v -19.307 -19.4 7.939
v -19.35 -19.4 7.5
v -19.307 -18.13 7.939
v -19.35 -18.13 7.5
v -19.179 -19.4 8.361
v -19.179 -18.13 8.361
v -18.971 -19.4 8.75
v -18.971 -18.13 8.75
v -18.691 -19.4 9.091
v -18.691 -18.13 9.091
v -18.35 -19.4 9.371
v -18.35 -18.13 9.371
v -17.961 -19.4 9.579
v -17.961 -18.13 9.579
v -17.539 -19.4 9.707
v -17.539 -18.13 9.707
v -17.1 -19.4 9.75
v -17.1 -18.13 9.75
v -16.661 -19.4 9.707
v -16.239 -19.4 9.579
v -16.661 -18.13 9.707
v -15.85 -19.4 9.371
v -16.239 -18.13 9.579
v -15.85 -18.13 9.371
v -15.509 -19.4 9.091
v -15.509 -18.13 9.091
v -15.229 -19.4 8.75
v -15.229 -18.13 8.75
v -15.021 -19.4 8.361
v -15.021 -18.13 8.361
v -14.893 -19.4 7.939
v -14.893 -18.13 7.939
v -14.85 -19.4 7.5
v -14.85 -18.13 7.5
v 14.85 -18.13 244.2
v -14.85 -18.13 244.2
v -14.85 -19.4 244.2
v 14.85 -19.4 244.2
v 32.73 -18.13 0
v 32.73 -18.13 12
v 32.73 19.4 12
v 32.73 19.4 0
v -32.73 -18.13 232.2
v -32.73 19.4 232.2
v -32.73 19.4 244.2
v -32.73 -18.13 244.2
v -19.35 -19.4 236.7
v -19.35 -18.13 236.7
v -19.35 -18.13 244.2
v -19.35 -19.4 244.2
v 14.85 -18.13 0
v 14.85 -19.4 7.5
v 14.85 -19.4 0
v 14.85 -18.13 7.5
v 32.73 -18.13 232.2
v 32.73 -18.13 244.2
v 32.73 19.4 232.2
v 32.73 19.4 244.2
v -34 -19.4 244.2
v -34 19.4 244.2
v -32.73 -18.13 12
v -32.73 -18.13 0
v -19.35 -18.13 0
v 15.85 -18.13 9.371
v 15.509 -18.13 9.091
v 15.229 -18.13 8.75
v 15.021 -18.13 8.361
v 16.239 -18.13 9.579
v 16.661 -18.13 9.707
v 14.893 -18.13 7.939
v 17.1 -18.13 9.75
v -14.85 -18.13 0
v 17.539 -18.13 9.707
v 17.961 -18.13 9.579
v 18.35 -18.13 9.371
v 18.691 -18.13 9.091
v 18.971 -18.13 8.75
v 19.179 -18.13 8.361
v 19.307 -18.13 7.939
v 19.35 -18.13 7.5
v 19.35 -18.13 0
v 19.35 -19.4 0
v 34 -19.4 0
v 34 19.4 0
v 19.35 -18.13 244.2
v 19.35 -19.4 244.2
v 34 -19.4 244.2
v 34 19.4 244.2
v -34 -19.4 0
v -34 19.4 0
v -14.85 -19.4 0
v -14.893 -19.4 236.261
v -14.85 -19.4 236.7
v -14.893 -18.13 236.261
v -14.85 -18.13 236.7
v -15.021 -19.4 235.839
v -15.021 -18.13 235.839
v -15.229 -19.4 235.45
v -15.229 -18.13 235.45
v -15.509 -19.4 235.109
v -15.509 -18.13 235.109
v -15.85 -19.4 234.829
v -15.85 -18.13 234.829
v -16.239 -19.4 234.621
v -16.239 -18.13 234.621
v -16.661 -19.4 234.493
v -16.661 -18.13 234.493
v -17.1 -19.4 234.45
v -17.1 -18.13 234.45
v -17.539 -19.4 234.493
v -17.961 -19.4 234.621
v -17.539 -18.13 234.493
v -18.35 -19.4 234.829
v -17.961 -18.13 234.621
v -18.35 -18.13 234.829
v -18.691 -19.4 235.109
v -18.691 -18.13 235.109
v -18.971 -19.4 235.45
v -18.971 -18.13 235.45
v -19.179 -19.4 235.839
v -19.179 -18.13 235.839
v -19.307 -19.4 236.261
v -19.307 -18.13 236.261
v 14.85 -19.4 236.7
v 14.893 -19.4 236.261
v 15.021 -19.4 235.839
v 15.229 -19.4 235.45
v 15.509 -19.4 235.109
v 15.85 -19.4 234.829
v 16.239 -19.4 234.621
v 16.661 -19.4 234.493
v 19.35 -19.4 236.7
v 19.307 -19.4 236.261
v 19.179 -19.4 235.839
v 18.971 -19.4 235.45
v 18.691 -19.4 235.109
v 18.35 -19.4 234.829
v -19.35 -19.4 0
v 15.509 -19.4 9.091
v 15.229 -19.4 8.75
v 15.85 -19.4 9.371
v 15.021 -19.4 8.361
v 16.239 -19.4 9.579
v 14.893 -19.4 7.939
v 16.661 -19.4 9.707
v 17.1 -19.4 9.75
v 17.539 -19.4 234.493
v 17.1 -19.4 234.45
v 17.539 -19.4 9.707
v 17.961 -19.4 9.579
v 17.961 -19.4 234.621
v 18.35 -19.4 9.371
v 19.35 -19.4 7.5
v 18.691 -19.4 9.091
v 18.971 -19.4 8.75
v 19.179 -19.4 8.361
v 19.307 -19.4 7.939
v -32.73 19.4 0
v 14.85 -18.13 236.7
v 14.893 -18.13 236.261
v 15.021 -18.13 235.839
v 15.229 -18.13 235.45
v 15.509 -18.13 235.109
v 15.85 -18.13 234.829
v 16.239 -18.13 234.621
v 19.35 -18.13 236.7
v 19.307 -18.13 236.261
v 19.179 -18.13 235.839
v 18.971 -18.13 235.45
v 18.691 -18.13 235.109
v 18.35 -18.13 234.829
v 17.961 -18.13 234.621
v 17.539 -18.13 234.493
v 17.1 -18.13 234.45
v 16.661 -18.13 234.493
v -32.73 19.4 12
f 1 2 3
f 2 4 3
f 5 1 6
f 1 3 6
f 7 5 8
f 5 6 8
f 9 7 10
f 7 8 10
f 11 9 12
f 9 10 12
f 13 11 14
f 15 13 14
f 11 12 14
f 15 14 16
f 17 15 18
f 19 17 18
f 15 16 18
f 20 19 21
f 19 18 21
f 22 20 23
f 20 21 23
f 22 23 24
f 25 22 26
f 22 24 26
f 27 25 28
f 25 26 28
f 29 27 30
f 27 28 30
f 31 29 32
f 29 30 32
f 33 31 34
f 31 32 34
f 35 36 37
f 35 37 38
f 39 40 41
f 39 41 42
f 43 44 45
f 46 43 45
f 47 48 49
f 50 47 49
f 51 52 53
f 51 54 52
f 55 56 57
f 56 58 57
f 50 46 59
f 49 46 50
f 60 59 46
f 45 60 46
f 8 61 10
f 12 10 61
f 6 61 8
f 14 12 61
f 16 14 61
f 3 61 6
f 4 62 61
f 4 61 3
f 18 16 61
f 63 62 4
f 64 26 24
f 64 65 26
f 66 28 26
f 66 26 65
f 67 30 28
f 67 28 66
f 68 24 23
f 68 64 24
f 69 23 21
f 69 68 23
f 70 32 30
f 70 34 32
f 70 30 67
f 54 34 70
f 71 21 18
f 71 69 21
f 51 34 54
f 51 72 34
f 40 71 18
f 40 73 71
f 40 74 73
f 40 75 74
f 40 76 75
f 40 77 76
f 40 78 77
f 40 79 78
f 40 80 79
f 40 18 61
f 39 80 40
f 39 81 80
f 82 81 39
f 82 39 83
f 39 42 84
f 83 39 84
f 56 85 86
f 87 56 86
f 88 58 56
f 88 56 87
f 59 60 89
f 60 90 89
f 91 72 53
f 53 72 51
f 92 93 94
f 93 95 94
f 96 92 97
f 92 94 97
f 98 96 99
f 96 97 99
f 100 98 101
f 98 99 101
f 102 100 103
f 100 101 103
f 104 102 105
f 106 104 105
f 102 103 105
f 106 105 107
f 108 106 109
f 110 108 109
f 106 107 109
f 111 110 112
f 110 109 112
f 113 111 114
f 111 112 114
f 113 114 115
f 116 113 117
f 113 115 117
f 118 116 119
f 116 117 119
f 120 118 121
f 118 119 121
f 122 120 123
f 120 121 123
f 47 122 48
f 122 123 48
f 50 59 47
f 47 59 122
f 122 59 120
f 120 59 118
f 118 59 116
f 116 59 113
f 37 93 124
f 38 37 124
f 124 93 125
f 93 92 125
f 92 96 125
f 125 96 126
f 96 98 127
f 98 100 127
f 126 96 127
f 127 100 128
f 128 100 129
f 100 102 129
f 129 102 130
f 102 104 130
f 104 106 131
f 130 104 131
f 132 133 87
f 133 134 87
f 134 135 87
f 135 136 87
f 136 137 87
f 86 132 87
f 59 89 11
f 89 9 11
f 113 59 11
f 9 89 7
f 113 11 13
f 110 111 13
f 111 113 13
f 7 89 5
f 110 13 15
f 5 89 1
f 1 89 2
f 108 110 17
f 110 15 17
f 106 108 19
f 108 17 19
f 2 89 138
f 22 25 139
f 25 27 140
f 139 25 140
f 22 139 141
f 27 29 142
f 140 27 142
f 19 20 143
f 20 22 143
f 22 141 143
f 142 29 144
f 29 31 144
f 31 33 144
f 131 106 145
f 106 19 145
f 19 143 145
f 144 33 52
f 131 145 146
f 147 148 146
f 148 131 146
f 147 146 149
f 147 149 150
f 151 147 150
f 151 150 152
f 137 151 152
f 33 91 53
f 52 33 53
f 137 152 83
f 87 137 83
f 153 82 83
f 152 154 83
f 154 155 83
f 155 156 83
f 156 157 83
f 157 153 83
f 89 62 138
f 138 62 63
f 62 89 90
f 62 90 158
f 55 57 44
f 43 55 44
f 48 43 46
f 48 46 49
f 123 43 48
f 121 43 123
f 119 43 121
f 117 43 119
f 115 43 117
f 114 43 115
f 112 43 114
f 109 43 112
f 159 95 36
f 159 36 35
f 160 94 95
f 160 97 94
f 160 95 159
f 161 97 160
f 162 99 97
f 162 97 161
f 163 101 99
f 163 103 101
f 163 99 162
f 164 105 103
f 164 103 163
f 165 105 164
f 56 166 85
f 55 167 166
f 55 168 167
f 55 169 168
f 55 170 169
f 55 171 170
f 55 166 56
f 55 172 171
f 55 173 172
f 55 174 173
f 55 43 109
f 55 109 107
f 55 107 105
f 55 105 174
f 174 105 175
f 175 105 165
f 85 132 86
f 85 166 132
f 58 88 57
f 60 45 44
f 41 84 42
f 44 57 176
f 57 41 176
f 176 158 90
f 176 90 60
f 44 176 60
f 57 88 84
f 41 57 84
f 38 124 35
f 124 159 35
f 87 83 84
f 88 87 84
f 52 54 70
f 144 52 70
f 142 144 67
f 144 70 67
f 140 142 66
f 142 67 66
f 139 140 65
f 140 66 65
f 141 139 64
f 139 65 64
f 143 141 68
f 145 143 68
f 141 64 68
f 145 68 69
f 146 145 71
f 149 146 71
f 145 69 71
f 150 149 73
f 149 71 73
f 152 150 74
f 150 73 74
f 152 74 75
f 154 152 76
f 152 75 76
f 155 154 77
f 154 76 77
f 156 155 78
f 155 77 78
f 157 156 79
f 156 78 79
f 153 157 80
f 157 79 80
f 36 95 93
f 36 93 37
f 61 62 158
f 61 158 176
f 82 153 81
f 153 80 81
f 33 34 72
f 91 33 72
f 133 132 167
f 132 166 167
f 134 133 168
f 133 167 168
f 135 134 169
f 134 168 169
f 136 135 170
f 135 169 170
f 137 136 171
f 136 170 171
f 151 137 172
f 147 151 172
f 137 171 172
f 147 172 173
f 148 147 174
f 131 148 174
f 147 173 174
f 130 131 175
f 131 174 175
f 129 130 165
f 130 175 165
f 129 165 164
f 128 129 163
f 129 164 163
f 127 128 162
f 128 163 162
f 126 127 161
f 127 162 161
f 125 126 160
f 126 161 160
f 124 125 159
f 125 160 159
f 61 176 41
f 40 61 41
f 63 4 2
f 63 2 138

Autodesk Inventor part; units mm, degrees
ref_plane "YZ Plane" through (0, 0, 0) normal (1, 0, 0) x (0, 1, 0)
ref_plane "XZ Plane" through (0, 0, 0) normal (0, 1, 0) x (-1, 0, 0)
sketch "Sketch1" plane through (0, 0, 0) normal (0, 0, 1) x (1, 0, 0)
  line L0 (-34, -19.4) -> (34, -19.4)
  line L1 (34, -19.4) -> (34, 19.4)
  line L2 (34, 19.4) -> (-34, 19.4)
  line L3 (-34, 19.4) -> (-34, -19.4)
  line L4 (-34, -19.4) -> (34, 19.4) construction
  line L5 (34, -19.4) -> (-34, 19.4) construction
  point P0 (0, 0)
  dimension "d0" = 68
  dimension "d1" = 38.8
extrude "Extrusion1" add sketch "Sketch1" along normal blind 244.2
sketch "Sketch2" plane through (-34, 19.4, 0) normal (0, 1, 0) x (1, 0, 0)
  line L0 (68, -244.2) -> (0, -244.2) projected
  line L1 (68, 0) -> (0, 0) projected
  arc A0 (19.15, -236.7) -> (14.65, -236.7) centre (16.9, -236.7) ccw
  arc A1 (53.35, -236.7) -> (48.85, -236.7) centre (51.1, -236.7) ccw
  arc A2 (48.85, -7.5) -> (53.35, -7.5) centre (51.1, -7.5) ccw
  arc A3 (14.65, -7.5) -> (19.15, -7.5) centre (16.9, -7.5) ccw
  line L2 (16.9, -236.7) -> (16.9, -7.5) construction
  line L3 (16.9, -7.5) -> (51.1, -7.5) construction
  line L4 (51.1, -7.5) -> (51.1, -236.7) construction
  line L5 (16.9, -236.7) -> (16.9, -244.2) construction
  line L6 (16.9, -7.5) -> (16.9, 0) construction
  line L7 (16.9, -7.5) -> (0, 0) construction
  line L8 (51.1, -7.5) -> (68, 0) construction
  line L9 (48.85, -236.7) -> (48.85, -244.2)
  line L10 (53.35, -236.7) -> (53.35, -244.2)
  line L11 (14.65, -236.7) -> (14.65, -244.2)
  line L12 (19.15, -236.7) -> (19.15, -244.2)
  line L13 (19.15, -7.5) -> (19.15, 0)
  line L14 (14.65, -7.5) -> (14.65, 0)
  line L15 (53.35, -7.5) -> (53.35, 0)
  line L16 (48.85, -7.5) -> (48.85, 0)
  point P0 (34, 0)
  dimension "d4" = 2.25
  dimension "d5" = 229.2
  dimension "d6" = 34.2
extrude "Extrusion2" cut sketch "Sketch2" against normal up to surface (38.8 mm away)
ref_plane "Work Plane1" through (34, -18.13, 0) normal (0, -1, 0) x (1, 0, 0)
sketch "Sketch3" plane through (-34, 19.4, 244.2) normal (0, 1, 0) x (1, 0, 0)
  line L0 (0, 244.2) -> (0, 0) projected
  line L1 (68, 244.2) -> (68, 0) projected
  line L2 (66.73, 0) -> (66.73, 12)
  line L3 (66.73, 12) -> (1.27, 12)
  line L4 (1.27, 12) -> (1.27, 0)
  line L5 (1.27, 0) -> (66.73, 0)
  line L6 (1.27, 0) -> (0, 0) construction
  line L7 (68, 0) -> (66.73, 0) construction
  line L8 (1.27, 232.2) -> (66.73, 232.2)
  line L9 (66.73, 232.2) -> (66.73, 244.2)
  line L10 (66.73, 244.2) -> (1.27, 244.2)
  line L11 (1.27, 244.2) -> (1.27, 232.2)
  line L12 (1.27, 244.2) -> (0, 244.2) construction
  point P0 (34, 244.2)
  dimension "d9" = 1.27
  dimension "d14" = 220.2
extrude "Extrusion3" cut sketch "Sketch3" against normal up to surface (37.53 mm away)
properties part number "UHP-1500-230"
